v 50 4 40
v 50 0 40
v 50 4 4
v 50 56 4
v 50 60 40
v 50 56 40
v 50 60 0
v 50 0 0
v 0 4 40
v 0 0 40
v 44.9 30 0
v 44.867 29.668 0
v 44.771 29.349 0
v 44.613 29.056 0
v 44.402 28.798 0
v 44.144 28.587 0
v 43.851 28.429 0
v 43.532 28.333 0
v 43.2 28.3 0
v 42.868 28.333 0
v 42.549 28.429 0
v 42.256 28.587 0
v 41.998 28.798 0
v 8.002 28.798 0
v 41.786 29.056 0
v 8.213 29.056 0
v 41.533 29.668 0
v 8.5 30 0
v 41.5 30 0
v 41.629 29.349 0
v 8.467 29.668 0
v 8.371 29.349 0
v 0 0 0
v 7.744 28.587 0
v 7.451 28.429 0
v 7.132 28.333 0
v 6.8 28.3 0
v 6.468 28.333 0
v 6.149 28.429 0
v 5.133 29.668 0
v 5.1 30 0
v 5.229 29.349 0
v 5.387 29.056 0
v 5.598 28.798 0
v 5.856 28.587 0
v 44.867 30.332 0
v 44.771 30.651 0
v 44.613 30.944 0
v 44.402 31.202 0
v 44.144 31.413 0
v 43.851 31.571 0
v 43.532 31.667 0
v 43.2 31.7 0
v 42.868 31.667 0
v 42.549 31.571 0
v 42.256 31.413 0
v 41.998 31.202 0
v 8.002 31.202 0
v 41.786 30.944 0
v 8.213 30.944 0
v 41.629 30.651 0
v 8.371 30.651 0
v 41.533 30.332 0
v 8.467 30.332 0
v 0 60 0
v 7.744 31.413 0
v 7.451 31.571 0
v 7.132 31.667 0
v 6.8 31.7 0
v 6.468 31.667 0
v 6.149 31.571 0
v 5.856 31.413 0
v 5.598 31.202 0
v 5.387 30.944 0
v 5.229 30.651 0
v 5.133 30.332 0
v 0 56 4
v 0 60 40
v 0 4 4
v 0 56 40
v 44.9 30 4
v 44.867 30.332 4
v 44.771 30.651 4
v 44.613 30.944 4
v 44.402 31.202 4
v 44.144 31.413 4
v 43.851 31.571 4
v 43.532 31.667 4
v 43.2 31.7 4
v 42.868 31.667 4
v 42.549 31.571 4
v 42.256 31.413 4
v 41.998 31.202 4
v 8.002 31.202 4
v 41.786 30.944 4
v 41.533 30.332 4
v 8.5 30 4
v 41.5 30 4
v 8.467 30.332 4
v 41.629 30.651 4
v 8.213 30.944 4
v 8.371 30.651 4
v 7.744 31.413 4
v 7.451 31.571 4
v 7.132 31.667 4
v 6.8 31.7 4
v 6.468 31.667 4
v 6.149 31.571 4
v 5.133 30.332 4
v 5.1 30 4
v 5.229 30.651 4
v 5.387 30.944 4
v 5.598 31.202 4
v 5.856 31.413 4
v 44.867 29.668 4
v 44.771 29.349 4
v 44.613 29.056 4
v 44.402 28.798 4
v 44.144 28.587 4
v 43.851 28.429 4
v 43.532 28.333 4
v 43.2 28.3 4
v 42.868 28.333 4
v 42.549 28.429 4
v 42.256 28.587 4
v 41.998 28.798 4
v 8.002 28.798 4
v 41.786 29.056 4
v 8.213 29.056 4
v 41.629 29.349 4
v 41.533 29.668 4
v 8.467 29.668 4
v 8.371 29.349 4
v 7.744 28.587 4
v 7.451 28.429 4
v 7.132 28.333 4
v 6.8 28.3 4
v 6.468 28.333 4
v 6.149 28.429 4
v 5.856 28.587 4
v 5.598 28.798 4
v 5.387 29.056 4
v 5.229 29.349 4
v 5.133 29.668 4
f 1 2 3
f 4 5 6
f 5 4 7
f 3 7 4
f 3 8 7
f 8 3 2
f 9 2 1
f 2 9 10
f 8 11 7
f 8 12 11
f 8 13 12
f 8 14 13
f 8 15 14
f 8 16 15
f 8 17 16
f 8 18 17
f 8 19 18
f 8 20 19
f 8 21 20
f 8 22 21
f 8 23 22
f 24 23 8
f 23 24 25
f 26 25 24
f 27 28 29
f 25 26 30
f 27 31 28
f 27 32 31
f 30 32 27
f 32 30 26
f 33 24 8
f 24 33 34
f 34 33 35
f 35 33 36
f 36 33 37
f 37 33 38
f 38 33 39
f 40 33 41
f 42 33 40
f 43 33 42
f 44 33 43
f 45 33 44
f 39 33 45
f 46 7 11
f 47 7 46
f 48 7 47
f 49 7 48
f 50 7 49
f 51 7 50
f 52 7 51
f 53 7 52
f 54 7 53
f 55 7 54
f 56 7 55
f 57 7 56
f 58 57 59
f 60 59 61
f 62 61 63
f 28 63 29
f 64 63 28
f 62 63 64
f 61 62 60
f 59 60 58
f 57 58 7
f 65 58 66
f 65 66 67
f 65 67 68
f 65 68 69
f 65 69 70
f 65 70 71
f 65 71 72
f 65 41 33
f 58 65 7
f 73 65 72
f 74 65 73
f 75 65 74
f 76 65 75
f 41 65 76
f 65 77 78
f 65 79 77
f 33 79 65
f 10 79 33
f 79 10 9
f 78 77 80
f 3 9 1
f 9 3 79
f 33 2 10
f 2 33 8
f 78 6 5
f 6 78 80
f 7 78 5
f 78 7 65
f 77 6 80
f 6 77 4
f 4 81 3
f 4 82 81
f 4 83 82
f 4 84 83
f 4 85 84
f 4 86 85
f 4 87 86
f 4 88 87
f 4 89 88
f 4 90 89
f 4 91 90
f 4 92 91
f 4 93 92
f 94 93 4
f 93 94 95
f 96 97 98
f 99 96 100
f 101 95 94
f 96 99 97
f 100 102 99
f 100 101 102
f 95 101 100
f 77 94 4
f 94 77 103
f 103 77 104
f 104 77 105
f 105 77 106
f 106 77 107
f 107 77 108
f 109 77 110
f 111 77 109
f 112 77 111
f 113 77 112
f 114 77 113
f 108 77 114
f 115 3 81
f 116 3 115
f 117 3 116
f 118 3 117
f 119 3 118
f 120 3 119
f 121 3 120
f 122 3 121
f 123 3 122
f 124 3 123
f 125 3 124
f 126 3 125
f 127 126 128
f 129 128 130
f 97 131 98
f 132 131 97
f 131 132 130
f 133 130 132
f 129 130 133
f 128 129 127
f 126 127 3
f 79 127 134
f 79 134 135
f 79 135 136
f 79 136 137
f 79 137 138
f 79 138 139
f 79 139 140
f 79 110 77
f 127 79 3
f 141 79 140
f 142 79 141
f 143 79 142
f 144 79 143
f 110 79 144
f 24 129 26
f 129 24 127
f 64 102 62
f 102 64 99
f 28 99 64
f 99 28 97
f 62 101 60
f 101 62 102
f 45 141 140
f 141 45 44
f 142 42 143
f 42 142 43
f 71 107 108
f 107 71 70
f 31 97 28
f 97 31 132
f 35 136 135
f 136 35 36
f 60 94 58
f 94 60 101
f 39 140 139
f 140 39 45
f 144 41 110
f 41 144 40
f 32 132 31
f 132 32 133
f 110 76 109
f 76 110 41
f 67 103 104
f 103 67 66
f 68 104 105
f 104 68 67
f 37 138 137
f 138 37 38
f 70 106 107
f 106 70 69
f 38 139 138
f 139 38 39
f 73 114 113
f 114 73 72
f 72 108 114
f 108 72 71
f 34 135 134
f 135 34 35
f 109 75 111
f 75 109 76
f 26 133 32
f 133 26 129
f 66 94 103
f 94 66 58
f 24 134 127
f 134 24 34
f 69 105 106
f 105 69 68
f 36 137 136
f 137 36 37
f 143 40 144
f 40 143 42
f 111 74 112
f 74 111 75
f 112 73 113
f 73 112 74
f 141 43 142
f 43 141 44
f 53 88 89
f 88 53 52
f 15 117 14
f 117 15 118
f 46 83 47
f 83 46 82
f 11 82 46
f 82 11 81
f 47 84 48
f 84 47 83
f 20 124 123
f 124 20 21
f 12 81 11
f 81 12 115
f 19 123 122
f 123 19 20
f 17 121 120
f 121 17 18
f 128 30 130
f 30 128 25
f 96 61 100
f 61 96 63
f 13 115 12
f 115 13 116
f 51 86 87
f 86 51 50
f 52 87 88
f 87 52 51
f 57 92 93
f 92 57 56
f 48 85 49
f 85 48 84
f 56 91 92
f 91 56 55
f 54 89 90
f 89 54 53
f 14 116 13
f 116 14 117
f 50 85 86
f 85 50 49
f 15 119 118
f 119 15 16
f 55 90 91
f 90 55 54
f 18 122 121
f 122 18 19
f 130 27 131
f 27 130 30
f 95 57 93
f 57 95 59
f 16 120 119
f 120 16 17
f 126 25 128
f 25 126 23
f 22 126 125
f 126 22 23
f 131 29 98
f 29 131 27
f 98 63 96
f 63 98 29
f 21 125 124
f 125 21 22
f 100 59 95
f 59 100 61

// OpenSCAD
$fn = 32;

// ----------------------------------------------------------------------
// U-bracket: 50 x 60 x 40 mm
// ----------------------------------------------------------------------

// --- parameters (mm) ---
length = 50;              // outer length, X
width = 60;               // outer width, Y
height = 40;              // upright height, Z
thick = 4;                // wall thickness
hole_d = 3.4;             // clearance for M3

module hole_z(px, py) {
  translate([px, py, -2.5]) cylinder(h = thick + 5, d = hole_d);
}
module hole_y_pz(pz) {
  /* through both uprights along Y */
  translate([0, -2.5, pz]) rotate([-90, 0, 0]) cylinder(h = width + 5, d = hole_d);
}

module base() {
  cube([length, width, thick]);
}

module uprights() {
  cube([length, thick, height]);
  translate([0, width - thick, 0]) cube([length, thick, height]);
}

difference() {
  union() {
    base();
    uprights();
  }
  hole_z(6.8, 30);
  hole_z(43.2, 30);
}
